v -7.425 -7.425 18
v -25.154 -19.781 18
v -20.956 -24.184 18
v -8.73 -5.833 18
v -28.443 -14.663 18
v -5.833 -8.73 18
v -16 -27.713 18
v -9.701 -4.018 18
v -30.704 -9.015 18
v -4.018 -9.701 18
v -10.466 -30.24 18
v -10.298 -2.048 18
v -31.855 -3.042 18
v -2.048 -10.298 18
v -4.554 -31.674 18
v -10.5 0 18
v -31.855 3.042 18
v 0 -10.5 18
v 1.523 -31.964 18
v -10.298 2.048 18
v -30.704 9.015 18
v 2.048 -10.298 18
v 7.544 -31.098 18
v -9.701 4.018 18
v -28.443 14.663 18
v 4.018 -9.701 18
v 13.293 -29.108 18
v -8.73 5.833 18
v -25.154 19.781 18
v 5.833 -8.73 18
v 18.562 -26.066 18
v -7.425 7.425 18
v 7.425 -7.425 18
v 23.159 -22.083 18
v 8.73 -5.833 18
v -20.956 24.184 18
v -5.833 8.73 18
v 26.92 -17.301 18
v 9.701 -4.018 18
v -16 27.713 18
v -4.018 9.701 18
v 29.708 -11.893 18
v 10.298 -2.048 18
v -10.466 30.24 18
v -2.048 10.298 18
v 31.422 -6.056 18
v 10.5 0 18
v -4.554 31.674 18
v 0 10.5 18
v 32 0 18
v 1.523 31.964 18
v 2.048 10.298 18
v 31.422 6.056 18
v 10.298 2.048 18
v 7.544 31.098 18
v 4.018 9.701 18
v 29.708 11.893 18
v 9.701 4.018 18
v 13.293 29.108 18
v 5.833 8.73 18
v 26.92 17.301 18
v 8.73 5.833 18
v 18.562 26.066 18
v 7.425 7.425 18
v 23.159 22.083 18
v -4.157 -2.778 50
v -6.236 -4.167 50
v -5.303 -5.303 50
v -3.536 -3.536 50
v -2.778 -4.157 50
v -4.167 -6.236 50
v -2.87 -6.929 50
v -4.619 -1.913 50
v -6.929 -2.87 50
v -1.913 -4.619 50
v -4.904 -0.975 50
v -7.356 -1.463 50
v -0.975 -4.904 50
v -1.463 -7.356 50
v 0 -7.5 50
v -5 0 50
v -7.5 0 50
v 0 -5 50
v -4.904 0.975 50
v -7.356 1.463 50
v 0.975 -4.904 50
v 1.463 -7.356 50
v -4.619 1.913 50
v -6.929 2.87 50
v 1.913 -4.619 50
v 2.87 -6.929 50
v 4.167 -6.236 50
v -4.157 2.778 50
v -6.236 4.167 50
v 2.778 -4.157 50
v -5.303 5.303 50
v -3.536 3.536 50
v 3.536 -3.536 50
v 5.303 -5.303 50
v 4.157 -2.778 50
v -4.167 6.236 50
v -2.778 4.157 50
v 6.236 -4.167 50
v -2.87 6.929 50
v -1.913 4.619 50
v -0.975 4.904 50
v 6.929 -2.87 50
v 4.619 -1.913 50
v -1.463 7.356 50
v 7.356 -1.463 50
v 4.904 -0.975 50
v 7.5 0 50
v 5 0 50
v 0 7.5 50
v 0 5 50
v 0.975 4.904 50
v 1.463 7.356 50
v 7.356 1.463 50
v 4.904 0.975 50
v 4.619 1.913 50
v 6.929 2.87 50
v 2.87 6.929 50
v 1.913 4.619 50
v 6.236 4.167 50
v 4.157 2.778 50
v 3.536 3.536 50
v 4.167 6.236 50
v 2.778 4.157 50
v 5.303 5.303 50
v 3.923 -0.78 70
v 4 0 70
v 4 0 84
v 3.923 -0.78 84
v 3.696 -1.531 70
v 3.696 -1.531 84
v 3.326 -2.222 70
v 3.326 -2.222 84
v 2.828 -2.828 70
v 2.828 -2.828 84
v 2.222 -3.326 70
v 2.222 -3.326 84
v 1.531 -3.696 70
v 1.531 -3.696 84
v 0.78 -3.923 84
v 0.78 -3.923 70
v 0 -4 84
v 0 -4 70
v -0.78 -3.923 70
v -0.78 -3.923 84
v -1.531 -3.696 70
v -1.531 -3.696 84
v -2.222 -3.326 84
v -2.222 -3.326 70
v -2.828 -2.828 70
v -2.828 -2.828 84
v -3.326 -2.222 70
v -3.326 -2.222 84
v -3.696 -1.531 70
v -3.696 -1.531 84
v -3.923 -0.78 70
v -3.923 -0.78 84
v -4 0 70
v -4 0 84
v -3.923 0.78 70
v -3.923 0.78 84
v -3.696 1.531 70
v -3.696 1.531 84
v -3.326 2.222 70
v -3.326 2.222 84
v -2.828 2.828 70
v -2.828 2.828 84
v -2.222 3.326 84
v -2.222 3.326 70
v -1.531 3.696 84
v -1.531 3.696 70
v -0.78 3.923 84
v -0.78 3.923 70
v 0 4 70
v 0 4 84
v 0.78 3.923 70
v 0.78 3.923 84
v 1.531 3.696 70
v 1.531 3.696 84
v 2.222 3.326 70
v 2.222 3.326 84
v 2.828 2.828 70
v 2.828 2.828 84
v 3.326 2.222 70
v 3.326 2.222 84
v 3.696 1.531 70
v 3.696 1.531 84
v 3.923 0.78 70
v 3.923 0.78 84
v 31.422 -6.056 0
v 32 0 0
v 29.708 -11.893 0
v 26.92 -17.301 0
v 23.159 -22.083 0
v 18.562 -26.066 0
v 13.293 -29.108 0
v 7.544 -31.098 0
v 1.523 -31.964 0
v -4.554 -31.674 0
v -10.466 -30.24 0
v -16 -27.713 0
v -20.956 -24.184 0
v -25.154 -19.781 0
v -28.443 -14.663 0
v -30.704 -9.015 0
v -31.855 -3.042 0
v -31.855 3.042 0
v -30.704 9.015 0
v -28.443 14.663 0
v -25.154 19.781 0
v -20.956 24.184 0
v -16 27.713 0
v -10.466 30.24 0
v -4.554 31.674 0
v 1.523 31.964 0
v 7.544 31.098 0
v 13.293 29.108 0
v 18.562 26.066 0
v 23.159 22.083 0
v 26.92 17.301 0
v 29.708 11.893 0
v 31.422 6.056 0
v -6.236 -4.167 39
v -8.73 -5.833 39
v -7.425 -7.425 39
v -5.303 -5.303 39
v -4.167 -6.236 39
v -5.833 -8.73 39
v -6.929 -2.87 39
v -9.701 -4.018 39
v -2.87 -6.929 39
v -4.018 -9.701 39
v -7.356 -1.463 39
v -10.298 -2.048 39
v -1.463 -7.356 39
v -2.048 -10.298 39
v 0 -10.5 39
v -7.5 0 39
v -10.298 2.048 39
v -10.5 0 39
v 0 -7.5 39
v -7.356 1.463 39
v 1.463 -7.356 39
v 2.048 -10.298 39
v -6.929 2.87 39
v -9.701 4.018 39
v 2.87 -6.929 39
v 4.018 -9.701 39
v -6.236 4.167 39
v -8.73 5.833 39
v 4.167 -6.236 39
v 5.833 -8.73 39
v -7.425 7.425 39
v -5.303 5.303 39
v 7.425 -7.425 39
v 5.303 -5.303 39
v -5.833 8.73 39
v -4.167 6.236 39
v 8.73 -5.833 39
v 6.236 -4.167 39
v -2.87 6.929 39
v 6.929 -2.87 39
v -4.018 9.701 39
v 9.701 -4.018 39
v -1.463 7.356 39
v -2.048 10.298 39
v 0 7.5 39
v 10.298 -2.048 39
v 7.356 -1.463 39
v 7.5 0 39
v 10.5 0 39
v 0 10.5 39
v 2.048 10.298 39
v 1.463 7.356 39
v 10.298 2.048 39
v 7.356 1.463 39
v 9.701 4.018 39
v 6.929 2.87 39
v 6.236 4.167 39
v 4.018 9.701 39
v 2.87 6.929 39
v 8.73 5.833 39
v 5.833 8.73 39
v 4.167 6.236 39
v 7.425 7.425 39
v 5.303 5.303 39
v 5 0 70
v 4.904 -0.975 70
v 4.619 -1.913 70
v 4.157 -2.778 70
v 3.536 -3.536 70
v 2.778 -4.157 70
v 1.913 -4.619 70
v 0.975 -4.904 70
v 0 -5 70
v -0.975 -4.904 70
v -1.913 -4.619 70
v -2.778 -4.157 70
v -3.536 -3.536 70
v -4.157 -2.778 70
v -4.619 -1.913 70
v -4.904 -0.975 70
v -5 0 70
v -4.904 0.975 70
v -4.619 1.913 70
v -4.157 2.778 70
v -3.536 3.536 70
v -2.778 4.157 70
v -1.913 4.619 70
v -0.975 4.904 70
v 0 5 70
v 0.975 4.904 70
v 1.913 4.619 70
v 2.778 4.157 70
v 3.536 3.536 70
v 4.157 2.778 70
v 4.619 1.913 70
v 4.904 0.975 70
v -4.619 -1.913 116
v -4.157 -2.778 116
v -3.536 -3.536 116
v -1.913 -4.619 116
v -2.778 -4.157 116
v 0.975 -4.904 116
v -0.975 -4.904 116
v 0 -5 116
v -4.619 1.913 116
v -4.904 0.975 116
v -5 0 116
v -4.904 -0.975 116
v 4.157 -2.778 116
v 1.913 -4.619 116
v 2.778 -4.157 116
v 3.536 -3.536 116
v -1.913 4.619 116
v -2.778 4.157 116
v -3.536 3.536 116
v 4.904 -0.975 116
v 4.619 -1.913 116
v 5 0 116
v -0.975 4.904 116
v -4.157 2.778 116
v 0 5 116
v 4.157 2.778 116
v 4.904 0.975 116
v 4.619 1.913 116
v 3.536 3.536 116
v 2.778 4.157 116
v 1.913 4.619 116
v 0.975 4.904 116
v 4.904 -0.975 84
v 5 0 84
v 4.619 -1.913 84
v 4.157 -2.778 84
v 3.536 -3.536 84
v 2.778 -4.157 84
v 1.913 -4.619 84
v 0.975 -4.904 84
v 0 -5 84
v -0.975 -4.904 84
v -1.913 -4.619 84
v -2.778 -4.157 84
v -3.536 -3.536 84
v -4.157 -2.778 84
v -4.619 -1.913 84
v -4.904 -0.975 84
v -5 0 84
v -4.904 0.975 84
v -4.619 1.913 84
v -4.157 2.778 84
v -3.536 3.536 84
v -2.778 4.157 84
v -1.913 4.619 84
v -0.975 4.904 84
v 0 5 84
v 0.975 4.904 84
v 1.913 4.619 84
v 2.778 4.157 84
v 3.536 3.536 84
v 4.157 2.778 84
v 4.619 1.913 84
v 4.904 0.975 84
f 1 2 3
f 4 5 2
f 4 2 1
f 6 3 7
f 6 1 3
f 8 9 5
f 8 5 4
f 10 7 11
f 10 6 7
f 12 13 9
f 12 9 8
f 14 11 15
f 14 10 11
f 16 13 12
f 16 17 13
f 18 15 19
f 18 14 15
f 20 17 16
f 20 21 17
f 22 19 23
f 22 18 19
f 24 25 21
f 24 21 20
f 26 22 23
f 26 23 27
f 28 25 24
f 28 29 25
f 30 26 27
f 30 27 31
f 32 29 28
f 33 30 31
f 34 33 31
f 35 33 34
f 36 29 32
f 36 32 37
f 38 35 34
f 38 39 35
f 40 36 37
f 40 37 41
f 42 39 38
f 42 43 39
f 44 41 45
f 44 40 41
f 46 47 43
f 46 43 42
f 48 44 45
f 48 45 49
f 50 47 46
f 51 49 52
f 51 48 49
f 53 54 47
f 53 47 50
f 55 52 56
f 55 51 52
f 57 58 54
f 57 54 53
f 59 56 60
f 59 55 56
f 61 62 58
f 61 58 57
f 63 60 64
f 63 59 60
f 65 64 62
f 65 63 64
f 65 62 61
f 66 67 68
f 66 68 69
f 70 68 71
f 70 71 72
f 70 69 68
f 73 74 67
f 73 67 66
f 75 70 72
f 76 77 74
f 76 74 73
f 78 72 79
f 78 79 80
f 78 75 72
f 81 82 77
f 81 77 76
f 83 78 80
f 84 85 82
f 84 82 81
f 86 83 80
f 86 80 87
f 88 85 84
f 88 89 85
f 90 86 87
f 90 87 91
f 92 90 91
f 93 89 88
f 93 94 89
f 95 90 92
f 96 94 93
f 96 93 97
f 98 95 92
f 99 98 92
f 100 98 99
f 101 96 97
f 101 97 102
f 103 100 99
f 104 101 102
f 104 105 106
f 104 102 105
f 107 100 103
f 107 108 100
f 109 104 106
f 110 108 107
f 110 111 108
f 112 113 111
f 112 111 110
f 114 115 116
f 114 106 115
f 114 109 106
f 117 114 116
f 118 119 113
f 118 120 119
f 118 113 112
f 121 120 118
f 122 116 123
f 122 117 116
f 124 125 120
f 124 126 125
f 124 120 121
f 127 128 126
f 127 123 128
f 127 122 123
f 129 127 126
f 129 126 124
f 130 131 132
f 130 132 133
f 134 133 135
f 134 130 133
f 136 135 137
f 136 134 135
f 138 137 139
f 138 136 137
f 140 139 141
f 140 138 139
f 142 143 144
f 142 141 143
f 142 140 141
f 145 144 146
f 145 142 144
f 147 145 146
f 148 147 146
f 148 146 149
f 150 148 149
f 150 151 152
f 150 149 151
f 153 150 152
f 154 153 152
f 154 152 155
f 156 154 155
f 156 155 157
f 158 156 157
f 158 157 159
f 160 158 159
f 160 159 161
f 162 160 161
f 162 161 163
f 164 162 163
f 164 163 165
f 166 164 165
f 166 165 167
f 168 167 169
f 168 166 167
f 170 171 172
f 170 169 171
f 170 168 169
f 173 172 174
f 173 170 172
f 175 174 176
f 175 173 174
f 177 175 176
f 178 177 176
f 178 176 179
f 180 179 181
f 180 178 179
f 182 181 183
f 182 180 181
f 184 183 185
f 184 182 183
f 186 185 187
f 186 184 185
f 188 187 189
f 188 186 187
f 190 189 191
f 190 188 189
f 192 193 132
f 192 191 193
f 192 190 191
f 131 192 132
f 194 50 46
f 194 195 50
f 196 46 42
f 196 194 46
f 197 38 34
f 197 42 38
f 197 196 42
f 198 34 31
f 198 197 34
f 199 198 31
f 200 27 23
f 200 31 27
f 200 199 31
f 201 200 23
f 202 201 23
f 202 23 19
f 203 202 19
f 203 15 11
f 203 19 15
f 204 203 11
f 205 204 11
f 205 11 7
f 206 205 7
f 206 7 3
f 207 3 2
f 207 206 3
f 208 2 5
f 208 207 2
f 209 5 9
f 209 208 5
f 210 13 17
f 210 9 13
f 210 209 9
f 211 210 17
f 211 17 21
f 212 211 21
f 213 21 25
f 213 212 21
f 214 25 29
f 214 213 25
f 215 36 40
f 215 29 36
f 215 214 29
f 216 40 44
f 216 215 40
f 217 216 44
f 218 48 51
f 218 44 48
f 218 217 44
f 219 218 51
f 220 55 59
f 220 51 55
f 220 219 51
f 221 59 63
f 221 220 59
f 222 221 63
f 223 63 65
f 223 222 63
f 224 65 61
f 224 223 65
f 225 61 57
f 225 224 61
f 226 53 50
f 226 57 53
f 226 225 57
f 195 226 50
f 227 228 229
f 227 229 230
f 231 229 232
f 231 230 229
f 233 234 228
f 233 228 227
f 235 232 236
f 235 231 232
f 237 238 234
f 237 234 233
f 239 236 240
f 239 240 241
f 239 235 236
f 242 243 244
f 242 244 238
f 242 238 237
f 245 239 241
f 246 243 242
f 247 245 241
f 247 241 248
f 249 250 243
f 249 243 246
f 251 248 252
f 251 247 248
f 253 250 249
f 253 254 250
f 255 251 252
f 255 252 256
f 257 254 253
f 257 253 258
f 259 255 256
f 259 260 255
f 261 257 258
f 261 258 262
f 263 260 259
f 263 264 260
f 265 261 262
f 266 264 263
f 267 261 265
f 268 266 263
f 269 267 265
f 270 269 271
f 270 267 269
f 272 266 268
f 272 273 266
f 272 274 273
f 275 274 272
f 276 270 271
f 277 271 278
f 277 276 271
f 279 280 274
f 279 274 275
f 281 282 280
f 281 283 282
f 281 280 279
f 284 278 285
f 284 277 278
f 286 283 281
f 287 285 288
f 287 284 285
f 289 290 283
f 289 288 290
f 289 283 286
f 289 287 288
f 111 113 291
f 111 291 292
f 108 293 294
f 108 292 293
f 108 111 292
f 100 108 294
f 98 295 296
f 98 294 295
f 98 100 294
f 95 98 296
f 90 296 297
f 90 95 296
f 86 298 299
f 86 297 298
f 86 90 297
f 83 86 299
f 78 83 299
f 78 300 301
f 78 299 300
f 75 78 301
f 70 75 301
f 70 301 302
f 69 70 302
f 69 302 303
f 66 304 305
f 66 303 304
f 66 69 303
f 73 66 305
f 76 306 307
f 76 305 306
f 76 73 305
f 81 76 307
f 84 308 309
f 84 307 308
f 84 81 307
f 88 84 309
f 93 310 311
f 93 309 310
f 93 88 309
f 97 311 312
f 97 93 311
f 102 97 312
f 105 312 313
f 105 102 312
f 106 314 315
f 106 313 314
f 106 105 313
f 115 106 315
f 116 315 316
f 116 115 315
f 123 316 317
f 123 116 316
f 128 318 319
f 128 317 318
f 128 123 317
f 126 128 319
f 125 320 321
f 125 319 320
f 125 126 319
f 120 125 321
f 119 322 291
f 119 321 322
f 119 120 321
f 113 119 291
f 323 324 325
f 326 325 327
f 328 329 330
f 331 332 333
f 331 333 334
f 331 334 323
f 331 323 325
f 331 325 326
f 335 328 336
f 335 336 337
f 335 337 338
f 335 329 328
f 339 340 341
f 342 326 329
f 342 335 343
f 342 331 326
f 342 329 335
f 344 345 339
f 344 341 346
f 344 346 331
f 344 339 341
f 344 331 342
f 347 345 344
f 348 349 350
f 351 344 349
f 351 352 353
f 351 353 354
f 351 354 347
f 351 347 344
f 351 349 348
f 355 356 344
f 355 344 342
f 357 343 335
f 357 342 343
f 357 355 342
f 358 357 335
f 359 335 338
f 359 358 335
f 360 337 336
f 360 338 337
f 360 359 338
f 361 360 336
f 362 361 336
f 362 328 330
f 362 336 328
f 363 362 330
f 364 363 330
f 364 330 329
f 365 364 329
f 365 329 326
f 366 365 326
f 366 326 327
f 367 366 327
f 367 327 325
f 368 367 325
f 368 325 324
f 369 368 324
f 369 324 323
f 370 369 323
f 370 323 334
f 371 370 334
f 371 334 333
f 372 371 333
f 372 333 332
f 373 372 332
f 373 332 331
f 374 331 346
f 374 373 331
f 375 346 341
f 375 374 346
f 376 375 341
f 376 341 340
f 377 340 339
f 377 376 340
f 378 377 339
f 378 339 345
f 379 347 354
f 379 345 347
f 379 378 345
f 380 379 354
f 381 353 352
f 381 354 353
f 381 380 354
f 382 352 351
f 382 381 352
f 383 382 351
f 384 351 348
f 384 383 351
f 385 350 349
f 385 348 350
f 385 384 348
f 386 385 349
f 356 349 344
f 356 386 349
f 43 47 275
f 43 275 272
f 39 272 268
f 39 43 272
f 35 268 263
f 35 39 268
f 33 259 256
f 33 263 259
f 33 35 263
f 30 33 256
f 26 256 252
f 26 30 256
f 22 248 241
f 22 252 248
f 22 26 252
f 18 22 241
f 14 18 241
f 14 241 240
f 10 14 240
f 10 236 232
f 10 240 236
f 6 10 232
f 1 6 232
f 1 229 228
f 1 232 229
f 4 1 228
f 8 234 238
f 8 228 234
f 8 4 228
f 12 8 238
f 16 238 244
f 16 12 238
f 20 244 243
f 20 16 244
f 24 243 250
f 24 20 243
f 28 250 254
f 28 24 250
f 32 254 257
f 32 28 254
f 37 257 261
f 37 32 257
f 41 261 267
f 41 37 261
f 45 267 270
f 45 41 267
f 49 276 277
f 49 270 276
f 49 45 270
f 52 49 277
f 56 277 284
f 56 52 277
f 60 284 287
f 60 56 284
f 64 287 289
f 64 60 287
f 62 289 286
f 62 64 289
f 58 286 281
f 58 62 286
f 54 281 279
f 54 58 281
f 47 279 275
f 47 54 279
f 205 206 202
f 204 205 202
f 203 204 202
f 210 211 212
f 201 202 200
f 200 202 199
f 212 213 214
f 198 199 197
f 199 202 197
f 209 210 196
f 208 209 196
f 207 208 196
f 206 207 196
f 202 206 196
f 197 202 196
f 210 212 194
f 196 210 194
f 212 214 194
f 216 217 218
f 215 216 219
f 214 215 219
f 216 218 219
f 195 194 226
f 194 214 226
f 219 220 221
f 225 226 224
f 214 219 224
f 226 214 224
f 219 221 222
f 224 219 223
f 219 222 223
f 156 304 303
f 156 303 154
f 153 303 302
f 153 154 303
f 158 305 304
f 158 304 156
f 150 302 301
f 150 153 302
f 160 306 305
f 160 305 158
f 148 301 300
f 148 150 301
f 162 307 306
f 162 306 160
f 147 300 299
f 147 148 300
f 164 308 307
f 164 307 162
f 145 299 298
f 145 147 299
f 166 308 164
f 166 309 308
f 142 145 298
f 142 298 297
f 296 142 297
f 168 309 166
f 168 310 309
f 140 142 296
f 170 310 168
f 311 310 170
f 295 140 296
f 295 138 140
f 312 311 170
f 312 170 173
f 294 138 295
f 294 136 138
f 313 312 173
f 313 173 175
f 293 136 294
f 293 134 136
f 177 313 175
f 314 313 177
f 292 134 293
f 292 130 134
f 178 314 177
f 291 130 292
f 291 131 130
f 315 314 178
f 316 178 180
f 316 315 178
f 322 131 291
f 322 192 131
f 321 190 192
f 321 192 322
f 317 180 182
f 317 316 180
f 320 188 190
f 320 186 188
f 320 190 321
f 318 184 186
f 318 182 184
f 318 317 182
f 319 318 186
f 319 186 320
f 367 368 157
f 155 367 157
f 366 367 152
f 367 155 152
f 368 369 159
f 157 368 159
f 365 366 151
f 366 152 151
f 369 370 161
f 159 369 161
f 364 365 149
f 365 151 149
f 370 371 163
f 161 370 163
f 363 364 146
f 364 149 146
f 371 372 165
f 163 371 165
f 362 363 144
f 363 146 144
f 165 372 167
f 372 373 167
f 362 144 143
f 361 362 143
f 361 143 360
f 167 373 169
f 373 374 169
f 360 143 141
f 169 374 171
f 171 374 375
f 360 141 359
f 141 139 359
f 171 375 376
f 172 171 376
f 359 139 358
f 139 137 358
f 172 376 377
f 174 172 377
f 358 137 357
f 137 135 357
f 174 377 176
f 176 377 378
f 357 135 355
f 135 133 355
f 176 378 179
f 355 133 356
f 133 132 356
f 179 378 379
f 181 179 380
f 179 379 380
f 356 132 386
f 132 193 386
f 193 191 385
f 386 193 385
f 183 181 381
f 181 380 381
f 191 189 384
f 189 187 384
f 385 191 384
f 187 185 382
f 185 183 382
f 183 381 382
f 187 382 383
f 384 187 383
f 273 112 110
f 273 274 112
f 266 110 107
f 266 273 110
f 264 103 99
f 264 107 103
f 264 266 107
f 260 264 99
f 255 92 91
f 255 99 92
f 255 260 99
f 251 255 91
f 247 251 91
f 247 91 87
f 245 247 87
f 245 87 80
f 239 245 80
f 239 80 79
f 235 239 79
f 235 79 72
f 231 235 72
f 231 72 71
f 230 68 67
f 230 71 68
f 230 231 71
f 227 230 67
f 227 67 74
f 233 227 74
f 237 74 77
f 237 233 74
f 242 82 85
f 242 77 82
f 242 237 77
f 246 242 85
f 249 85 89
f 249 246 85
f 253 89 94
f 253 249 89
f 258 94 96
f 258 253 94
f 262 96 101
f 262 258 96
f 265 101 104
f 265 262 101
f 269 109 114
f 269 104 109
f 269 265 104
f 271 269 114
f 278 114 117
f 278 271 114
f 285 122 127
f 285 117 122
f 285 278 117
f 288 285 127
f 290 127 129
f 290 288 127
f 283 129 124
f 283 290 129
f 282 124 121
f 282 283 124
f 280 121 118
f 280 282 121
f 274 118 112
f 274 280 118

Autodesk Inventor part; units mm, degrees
ref_plane "YZ Plane" through (0, 0, 0) normal (1, 0, 0) x (0, 1, 0)
ref_plane "XZ Plane" through (0, 0, 0) normal (0, 1, 0) x (-1, 0, 0)
ref_plane "XY Plane" through (0, 0, 0) normal (0, 0, 1) x (1, 0, 0)
sketch "Sketch1" plane through (0, 0, 0) normal (0, 0, 1) x (1, 0, 0)
  circle A0 centre (0, 0) radius 1625.6
  circle A1 centre (0, 0) radius 32
  line L0 (0, 32) -> (0, -32) construction
  line L1 (-32, 0) -> (32, 0) construction
  dimension "d2" = 64
extrude "Extrusion1" add sketch "Sketch1" along normal blind 18 contours A1
sketch "Sketch2" plane through (0, 0, 18) normal (0, 0, 1) x (1, 0, 0)
  circle A0 centre (0, 0) radius 10.5
  dimension "d7" = 21
extrude "Extrusion2" add sketch "Sketch2" along normal blind 21
sketch "Sketch3" plane through (0, 0, 39) normal (0, 0, 1) x (1, 0, 0)
  circle A0 centre (0, 0) radius 7.5
  dimension "d10" = 15
extrude "Extrusion3" add sketch "Sketch3" along normal blind 11
sketch "Sketch4" plane through (0, 0, 50) normal (0, 0, 1) x (1, 0, 0)
  circle A0 centre (0, 0) radius 5
  dimension "d13" = 10
extrude "Extrusion4" add sketch "Sketch4" along normal blind 20
sketch "Sketch5" plane through (0, 0, 70) normal (0, 0, 1) x (1, 0, 0)
  circle A0 centre (0, 0) radius 4
  dimension "d16" = 8
extrude "Extrusion5" add sketch "Sketch5" along normal blind 14
sketch "Sketch6" plane through (0, 0, 84) normal (0, 0, 1) x (1, 0, 0)
  circle A0 centre (0, 0) radius 5
  dimension "d19" = 10
extrude "Extrusion6" add sketch "Sketch6" along normal blind 32
